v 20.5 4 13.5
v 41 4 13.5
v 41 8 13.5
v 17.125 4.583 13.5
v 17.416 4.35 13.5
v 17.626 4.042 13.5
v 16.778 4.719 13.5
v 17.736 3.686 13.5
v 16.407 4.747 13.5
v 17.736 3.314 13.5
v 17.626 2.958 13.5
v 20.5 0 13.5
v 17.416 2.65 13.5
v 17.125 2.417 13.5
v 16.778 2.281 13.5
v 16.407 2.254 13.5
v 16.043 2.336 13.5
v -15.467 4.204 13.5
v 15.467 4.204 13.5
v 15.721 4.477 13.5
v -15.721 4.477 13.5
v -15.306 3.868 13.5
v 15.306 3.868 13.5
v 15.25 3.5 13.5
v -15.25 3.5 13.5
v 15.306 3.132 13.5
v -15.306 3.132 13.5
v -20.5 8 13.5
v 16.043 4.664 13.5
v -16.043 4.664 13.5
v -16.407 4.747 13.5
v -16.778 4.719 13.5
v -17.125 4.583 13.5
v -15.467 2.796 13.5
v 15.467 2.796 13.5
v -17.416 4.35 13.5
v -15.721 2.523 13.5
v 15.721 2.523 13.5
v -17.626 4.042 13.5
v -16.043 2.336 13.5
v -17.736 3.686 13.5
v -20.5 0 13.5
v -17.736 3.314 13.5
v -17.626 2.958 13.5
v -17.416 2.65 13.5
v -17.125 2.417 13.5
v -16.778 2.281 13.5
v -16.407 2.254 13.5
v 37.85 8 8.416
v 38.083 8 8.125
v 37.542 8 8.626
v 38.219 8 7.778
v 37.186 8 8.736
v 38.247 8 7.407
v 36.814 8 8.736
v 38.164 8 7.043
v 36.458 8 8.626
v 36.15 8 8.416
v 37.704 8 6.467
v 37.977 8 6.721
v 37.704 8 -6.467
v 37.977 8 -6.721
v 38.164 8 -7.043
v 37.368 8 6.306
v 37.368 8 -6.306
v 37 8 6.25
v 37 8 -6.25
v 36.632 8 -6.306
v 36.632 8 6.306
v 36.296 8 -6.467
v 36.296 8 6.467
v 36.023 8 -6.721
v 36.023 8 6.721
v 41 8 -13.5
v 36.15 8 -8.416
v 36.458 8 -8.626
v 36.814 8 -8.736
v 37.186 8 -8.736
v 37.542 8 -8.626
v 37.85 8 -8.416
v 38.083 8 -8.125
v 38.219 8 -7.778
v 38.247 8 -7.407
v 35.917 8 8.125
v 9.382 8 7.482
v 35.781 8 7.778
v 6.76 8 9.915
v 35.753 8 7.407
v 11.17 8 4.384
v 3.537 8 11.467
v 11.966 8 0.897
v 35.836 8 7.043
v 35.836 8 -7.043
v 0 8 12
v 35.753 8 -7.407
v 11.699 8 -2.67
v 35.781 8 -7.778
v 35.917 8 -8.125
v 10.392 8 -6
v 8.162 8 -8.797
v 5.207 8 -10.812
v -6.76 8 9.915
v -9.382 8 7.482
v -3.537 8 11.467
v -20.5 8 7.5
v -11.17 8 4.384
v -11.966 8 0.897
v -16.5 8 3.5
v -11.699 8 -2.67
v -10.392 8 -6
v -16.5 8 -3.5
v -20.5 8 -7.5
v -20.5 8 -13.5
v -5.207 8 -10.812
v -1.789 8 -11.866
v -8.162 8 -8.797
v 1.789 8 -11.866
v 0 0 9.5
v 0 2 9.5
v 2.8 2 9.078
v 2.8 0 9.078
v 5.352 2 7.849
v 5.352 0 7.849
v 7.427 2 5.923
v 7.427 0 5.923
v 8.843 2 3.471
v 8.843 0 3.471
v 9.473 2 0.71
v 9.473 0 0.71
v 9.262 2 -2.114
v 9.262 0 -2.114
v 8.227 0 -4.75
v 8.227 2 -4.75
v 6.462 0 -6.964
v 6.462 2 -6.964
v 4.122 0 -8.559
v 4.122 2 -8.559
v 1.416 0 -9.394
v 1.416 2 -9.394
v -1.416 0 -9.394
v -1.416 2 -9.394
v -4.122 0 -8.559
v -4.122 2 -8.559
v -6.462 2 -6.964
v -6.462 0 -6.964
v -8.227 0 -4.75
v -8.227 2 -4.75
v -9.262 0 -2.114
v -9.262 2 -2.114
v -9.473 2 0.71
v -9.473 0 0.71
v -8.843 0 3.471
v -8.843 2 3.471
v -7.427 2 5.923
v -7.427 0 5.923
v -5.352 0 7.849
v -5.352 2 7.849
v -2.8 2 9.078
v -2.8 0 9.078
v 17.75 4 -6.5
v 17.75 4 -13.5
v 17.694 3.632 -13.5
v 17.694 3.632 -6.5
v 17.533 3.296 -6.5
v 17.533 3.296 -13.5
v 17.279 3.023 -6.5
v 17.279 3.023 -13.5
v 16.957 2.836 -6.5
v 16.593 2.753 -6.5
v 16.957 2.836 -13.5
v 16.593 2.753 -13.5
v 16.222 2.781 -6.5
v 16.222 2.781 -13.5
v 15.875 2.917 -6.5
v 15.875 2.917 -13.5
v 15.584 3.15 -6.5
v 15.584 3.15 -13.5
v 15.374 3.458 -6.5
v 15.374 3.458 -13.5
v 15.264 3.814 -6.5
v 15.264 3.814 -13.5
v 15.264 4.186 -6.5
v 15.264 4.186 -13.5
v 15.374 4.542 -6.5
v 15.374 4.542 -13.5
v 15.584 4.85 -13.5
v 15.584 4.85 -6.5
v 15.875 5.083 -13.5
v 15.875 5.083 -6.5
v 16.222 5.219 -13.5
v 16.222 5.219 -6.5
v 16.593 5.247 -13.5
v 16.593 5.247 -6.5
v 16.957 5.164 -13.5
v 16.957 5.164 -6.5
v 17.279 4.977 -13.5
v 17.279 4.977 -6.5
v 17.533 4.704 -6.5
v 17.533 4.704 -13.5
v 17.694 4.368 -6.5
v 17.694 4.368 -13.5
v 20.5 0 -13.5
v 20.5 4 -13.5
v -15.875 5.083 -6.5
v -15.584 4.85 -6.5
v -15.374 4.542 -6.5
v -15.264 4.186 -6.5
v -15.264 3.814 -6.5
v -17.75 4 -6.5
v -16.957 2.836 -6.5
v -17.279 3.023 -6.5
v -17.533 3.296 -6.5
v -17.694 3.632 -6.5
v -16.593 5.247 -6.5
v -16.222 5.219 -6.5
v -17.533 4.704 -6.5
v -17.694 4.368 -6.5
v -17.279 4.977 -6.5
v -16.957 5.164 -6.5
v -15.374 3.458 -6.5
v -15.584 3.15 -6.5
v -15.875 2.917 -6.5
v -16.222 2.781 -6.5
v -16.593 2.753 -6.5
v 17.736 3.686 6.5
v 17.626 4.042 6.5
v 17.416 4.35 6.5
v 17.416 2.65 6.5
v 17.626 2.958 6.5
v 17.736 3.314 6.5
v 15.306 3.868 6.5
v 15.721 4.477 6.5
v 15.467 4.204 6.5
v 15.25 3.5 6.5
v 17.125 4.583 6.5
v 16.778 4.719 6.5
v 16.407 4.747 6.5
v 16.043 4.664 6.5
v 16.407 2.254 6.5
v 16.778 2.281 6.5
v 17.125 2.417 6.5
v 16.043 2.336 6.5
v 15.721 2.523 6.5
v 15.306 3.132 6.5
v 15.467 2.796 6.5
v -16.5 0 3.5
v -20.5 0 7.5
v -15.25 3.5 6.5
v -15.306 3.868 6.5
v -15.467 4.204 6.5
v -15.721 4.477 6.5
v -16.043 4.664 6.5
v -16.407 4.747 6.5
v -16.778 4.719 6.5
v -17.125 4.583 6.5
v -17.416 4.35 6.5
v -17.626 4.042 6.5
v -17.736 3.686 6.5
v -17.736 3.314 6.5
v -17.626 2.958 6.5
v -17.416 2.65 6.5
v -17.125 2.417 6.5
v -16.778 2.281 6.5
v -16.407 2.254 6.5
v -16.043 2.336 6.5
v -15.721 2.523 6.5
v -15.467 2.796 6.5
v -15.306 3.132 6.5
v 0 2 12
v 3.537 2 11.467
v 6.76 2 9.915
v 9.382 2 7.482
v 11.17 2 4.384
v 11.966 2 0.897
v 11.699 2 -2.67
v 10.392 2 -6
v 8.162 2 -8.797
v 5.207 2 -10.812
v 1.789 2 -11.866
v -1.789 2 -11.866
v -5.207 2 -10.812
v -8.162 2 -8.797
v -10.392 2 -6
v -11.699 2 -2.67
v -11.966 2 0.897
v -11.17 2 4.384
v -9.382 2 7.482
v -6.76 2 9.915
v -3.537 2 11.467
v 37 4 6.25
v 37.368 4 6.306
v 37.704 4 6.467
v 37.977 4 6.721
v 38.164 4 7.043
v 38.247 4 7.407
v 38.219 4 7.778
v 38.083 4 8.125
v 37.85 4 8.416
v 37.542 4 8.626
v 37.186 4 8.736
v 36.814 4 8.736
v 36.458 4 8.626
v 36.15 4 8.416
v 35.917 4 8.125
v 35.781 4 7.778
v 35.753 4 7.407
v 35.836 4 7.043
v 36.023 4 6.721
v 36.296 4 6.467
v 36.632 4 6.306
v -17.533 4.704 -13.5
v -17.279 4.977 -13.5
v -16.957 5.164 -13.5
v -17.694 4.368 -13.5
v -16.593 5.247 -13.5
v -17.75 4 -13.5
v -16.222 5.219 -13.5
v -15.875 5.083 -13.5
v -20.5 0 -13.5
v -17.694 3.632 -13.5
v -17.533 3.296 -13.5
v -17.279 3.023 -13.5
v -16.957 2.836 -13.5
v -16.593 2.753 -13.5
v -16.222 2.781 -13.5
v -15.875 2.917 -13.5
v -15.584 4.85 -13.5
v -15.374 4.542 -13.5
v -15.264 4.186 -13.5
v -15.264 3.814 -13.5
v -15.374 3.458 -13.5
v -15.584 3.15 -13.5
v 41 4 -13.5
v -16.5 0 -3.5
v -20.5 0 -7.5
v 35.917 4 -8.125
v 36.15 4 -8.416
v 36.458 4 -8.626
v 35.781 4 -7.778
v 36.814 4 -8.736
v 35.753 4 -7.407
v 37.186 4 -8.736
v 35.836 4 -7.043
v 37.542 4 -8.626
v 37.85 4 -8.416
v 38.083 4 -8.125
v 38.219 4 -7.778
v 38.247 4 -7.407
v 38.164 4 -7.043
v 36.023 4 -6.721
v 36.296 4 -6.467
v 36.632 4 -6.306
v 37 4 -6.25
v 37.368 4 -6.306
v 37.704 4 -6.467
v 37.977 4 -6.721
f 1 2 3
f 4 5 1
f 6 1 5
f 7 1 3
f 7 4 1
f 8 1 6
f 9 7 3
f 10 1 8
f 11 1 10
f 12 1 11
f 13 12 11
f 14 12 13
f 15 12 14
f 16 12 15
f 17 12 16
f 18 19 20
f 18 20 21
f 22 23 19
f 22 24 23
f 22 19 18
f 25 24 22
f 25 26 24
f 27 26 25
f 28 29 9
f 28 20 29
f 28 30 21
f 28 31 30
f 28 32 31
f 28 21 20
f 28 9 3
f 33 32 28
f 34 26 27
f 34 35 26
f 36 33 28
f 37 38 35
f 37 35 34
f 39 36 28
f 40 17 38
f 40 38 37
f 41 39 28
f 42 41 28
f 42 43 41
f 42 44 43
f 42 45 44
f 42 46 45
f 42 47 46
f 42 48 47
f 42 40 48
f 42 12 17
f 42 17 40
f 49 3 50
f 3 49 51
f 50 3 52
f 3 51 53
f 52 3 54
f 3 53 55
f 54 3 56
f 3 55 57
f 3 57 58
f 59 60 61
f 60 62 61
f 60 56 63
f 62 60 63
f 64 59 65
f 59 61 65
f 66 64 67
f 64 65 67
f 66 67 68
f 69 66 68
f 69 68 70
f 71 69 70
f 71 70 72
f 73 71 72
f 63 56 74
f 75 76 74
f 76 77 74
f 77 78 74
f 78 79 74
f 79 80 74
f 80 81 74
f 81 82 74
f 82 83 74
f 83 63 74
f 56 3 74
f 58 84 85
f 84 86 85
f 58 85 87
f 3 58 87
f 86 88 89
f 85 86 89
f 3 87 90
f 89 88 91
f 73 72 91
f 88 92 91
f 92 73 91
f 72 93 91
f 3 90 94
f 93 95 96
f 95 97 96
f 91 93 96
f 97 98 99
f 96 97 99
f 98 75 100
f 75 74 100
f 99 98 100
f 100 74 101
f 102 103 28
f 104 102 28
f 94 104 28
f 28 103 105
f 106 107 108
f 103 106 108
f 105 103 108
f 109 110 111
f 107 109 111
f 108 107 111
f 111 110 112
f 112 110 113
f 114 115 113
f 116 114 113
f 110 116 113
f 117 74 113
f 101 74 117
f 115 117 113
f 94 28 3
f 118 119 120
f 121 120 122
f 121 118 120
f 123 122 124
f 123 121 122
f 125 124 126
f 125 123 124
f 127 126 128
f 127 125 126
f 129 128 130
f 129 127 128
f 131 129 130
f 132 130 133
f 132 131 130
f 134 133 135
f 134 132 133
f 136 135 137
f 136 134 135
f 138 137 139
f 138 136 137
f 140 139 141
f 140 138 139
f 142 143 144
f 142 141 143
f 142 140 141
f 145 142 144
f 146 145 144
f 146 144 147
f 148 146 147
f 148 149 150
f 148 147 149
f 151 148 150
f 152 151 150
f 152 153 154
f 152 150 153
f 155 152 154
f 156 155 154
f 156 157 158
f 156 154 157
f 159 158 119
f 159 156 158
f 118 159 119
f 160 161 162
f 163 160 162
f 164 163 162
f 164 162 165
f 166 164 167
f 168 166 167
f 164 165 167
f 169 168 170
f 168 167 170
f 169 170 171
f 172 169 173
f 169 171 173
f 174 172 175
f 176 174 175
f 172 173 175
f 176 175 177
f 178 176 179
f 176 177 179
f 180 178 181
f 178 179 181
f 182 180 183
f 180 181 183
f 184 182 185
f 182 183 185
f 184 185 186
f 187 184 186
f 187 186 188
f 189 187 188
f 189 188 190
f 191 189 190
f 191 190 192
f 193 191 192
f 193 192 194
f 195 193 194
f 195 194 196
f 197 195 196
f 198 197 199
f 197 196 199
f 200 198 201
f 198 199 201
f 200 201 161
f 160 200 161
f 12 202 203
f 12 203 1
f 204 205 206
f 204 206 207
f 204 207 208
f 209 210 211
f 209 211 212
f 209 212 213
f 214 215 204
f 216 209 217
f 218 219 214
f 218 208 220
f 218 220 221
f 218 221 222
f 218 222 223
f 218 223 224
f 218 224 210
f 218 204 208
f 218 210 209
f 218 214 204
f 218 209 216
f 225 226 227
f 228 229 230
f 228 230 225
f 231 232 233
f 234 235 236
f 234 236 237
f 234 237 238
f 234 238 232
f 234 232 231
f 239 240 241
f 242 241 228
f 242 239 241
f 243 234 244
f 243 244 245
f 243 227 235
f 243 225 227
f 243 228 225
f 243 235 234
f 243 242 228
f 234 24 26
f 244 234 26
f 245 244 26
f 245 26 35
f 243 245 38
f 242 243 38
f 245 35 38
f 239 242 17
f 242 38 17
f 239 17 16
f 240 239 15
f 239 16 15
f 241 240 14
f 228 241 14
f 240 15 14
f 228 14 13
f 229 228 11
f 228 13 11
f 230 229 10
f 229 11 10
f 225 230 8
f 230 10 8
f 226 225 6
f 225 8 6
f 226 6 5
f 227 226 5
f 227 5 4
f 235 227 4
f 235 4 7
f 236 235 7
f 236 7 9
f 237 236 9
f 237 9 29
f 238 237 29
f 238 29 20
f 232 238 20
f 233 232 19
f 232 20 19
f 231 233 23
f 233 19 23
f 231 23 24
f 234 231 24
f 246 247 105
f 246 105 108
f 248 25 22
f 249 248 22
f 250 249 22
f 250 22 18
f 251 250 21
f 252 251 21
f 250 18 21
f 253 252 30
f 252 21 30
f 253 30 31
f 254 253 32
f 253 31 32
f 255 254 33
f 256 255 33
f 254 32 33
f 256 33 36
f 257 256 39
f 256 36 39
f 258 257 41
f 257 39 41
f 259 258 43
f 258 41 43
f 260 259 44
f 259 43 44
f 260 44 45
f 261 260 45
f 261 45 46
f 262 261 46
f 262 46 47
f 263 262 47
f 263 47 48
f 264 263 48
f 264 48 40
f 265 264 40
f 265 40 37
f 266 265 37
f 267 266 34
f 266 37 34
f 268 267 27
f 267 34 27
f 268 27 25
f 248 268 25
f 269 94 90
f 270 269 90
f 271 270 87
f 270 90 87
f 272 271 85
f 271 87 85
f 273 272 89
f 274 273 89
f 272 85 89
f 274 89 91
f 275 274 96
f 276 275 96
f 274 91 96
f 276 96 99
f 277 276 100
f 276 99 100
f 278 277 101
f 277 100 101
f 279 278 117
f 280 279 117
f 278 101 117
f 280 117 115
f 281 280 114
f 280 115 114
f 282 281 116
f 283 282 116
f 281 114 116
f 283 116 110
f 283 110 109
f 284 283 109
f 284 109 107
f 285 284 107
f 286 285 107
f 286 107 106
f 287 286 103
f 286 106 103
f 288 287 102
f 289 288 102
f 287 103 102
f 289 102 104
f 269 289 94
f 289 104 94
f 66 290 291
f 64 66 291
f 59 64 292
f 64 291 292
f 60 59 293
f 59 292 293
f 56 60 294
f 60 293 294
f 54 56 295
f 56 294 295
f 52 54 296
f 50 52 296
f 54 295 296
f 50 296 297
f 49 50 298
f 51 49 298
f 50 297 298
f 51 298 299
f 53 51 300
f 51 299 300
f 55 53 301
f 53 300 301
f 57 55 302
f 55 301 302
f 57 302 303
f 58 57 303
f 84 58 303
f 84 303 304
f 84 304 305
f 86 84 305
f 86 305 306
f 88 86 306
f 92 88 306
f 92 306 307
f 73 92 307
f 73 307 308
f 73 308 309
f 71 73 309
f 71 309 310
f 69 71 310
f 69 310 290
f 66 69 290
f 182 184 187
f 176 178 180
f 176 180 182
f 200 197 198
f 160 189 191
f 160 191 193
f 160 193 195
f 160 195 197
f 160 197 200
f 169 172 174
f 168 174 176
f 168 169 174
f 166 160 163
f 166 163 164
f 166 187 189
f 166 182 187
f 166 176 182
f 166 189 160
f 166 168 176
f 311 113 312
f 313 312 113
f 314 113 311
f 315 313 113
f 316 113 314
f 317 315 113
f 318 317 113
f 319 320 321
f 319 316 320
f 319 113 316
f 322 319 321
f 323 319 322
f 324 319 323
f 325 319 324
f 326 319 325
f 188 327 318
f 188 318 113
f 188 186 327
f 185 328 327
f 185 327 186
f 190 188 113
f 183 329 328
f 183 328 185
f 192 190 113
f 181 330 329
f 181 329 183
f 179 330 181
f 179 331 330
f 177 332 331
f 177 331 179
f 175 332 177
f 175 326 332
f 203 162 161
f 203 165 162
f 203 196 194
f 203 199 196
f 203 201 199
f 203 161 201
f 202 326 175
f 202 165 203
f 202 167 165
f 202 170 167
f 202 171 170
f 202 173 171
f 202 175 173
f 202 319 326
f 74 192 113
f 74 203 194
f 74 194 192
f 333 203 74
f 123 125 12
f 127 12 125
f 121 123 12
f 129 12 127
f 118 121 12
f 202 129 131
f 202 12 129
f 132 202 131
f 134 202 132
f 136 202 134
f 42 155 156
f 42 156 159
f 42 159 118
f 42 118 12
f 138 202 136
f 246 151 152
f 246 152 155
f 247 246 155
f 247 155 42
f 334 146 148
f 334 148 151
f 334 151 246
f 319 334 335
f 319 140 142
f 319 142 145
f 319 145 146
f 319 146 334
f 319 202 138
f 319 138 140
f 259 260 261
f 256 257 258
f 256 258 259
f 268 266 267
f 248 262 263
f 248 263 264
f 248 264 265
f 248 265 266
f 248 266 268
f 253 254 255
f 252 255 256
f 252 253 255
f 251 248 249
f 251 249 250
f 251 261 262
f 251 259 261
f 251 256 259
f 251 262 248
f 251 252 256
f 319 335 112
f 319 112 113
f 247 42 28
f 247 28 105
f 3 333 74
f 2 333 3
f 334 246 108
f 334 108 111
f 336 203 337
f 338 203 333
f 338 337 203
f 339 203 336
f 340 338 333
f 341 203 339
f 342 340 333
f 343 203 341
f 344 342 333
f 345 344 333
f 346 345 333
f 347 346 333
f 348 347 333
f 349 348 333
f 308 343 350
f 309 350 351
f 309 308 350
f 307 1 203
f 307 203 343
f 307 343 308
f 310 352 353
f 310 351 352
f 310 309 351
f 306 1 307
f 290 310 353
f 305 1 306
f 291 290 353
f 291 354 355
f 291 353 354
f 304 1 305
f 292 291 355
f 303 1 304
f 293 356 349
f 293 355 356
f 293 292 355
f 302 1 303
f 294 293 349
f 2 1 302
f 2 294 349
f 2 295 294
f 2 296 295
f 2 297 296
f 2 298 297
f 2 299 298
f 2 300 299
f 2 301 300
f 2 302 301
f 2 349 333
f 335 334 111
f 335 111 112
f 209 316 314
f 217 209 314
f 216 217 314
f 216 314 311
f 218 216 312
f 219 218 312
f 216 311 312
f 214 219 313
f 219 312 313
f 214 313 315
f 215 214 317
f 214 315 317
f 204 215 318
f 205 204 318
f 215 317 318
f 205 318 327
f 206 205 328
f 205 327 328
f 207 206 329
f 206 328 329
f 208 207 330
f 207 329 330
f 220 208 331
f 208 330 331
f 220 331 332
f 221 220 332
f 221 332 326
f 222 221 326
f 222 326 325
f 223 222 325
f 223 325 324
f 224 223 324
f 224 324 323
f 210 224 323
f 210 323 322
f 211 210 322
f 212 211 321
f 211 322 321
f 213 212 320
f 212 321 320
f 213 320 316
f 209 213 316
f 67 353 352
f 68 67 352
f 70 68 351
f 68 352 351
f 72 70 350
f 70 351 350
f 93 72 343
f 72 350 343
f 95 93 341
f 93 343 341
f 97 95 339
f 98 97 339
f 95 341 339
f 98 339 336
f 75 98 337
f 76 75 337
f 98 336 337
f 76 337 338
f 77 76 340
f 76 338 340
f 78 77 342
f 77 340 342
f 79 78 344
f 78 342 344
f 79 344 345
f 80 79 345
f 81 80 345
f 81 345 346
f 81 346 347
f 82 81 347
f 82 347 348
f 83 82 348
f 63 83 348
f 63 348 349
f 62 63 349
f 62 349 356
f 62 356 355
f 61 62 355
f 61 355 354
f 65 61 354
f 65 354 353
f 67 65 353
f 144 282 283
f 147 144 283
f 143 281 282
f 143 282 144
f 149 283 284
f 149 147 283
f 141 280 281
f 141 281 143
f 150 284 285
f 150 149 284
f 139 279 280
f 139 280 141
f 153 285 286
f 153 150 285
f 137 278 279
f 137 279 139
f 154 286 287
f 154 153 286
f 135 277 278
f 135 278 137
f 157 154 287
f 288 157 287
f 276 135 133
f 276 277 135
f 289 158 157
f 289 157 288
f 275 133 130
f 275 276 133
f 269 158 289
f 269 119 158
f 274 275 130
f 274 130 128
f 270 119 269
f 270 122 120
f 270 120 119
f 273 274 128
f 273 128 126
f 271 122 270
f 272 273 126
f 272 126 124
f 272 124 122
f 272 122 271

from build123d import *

# Parameters (mm, degrees)
SKETCH_1_R          = 9.5
EXTRUDE_1_DEPTH     = 8
SKETCH_1_2_R        = 9.5
EXTRUDE_2_DEPTH     = 8
SKETCH_2_R          = 12
CUT_EXTRUDE_1_DEPTH = 6
SKETCH_3_W          = 20.5
SKETCH_3_H          = 27
CUT_EXTRUDE_2_DEPTH = 4
SKETCH_4_R          = 1.25
CUT_EXTRUDE_3_DEPTH = 5
SKETCH_5_R          = 1.25
CUT_EXTRUDE_4_DEPTH = 7
SKETCH_6_R          = 1.25
CUT_EXTRUDE_5_DEPTH = 7


with BuildPart() as part:
    # Sketch 1 → Extrude 1 (new body)
    with BuildSketch(Plane(origin=(0, 0, 0), x_dir=(1, 0, 0), z_dir=(0, 1, 0))):
        Polygon((-20.5, -13.5), (-20.5, -7.5), (-16.5, -3.5), (-16.5, 3.5), (-20.5, 7.5), (-20.5, 13.5), (41, 13.5), (41, -13.5), align=None)
        with Locations(Location((0, 0, 0), (0, 0, 270))):  # turned: the seam where the file's is
            Circle(SKETCH_1_R, mode=Mode.SUBTRACT)
    extrude(amount=EXTRUDE_1_DEPTH)

    # Sketch 1_2 → Extrude 2 (add)
    with BuildSketch(Plane(origin=(0, 0, 0), x_dir=(1, 0, 0), z_dir=(0, 1, 0))):
        Polygon((-20.5, -13.5), (-20.5, -7.5), (-16.5, -3.5), (-16.5, 3.5), (-20.5, 7.5), (-20.5, 13.5), (41, 13.5), (41, -13.5), align=None)
        with Locations(Location((0, 0, 0), (0, 0, 270))):  # turned: the seam where the file's is
            Circle(SKETCH_1_2_R, mode=Mode.SUBTRACT)
    extrude(amount=EXTRUDE_2_DEPTH)

    # Sketch 2 → Cut-Extrude 1 (cut)
    with BuildSketch(Plane(origin=(0, 8, 0), x_dir=(1, 0, 0), z_dir=(0, 1, 0))):
        with Locations(Location((0, 0, 0), (0, 0, 270))):  # turned: the seam where the file's is
            Circle(SKETCH_2_R)
    extrude(amount=-CUT_EXTRUDE_1_DEPTH, mode=Mode.SUBTRACT)

    # Sketch 3 → Cut-Extrude 2 (cut)
    with BuildSketch(Plane.XZ):
        with Locations((30.75, 0)):
            Rectangle(SKETCH_3_W, SKETCH_3_H)
    extrude(amount=-CUT_EXTRUDE_2_DEPTH, mode=Mode.SUBTRACT)

    # Sketch 4 → Cut-Extrude 3 (cut, through all)
    with BuildSketch(Plane.XZ.offset(-4)):
        with Locations(Location((37, 7.5, 0), (0, 0, 270))):  # turned: the seam where the file's is
            Circle(SKETCH_4_R)
        with Locations(Location((37, -7.5, 0), (0, 0, 90))):  # turned: the seam where the file's is
            Circle(SKETCH_4_R)
    extrude(amount=-CUT_EXTRUDE_3_DEPTH, mode=Mode.SUBTRACT)

    # Sketch 5 → Cut-Extrude 4 (cut)
    with BuildSketch(Plane.XY.offset(13.5)):
        with Locations((-16.5, 3.500018951)):
            Circle(SKETCH_5_R)
        with Locations(Location((16.5, 3.500018951, 0), (0, 0, 180))):  # turned: the seam where the file's is
            Circle(SKETCH_5_R)
    extrude(amount=-CUT_EXTRUDE_4_DEPTH, mode=Mode.SUBTRACT)

    # Sketch 6 → Cut-Extrude 5 (cut)
    with BuildSketch(Plane(origin=(0, 0, -13.5), x_dir=(-1, 0, 0), z_dir=(0, 0, -1))):
        with Locations((16.5, 4)):
            Circle(SKETCH_6_R)
        with Locations(Location((-16.5, 4, 0), (0, 0, 180))):  # turned: the seam where the file's is
            Circle(SKETCH_6_R)
    extrude(amount=-CUT_EXTRUDE_5_DEPTH, mode=Mode.SUBTRACT)


solid = part.part
